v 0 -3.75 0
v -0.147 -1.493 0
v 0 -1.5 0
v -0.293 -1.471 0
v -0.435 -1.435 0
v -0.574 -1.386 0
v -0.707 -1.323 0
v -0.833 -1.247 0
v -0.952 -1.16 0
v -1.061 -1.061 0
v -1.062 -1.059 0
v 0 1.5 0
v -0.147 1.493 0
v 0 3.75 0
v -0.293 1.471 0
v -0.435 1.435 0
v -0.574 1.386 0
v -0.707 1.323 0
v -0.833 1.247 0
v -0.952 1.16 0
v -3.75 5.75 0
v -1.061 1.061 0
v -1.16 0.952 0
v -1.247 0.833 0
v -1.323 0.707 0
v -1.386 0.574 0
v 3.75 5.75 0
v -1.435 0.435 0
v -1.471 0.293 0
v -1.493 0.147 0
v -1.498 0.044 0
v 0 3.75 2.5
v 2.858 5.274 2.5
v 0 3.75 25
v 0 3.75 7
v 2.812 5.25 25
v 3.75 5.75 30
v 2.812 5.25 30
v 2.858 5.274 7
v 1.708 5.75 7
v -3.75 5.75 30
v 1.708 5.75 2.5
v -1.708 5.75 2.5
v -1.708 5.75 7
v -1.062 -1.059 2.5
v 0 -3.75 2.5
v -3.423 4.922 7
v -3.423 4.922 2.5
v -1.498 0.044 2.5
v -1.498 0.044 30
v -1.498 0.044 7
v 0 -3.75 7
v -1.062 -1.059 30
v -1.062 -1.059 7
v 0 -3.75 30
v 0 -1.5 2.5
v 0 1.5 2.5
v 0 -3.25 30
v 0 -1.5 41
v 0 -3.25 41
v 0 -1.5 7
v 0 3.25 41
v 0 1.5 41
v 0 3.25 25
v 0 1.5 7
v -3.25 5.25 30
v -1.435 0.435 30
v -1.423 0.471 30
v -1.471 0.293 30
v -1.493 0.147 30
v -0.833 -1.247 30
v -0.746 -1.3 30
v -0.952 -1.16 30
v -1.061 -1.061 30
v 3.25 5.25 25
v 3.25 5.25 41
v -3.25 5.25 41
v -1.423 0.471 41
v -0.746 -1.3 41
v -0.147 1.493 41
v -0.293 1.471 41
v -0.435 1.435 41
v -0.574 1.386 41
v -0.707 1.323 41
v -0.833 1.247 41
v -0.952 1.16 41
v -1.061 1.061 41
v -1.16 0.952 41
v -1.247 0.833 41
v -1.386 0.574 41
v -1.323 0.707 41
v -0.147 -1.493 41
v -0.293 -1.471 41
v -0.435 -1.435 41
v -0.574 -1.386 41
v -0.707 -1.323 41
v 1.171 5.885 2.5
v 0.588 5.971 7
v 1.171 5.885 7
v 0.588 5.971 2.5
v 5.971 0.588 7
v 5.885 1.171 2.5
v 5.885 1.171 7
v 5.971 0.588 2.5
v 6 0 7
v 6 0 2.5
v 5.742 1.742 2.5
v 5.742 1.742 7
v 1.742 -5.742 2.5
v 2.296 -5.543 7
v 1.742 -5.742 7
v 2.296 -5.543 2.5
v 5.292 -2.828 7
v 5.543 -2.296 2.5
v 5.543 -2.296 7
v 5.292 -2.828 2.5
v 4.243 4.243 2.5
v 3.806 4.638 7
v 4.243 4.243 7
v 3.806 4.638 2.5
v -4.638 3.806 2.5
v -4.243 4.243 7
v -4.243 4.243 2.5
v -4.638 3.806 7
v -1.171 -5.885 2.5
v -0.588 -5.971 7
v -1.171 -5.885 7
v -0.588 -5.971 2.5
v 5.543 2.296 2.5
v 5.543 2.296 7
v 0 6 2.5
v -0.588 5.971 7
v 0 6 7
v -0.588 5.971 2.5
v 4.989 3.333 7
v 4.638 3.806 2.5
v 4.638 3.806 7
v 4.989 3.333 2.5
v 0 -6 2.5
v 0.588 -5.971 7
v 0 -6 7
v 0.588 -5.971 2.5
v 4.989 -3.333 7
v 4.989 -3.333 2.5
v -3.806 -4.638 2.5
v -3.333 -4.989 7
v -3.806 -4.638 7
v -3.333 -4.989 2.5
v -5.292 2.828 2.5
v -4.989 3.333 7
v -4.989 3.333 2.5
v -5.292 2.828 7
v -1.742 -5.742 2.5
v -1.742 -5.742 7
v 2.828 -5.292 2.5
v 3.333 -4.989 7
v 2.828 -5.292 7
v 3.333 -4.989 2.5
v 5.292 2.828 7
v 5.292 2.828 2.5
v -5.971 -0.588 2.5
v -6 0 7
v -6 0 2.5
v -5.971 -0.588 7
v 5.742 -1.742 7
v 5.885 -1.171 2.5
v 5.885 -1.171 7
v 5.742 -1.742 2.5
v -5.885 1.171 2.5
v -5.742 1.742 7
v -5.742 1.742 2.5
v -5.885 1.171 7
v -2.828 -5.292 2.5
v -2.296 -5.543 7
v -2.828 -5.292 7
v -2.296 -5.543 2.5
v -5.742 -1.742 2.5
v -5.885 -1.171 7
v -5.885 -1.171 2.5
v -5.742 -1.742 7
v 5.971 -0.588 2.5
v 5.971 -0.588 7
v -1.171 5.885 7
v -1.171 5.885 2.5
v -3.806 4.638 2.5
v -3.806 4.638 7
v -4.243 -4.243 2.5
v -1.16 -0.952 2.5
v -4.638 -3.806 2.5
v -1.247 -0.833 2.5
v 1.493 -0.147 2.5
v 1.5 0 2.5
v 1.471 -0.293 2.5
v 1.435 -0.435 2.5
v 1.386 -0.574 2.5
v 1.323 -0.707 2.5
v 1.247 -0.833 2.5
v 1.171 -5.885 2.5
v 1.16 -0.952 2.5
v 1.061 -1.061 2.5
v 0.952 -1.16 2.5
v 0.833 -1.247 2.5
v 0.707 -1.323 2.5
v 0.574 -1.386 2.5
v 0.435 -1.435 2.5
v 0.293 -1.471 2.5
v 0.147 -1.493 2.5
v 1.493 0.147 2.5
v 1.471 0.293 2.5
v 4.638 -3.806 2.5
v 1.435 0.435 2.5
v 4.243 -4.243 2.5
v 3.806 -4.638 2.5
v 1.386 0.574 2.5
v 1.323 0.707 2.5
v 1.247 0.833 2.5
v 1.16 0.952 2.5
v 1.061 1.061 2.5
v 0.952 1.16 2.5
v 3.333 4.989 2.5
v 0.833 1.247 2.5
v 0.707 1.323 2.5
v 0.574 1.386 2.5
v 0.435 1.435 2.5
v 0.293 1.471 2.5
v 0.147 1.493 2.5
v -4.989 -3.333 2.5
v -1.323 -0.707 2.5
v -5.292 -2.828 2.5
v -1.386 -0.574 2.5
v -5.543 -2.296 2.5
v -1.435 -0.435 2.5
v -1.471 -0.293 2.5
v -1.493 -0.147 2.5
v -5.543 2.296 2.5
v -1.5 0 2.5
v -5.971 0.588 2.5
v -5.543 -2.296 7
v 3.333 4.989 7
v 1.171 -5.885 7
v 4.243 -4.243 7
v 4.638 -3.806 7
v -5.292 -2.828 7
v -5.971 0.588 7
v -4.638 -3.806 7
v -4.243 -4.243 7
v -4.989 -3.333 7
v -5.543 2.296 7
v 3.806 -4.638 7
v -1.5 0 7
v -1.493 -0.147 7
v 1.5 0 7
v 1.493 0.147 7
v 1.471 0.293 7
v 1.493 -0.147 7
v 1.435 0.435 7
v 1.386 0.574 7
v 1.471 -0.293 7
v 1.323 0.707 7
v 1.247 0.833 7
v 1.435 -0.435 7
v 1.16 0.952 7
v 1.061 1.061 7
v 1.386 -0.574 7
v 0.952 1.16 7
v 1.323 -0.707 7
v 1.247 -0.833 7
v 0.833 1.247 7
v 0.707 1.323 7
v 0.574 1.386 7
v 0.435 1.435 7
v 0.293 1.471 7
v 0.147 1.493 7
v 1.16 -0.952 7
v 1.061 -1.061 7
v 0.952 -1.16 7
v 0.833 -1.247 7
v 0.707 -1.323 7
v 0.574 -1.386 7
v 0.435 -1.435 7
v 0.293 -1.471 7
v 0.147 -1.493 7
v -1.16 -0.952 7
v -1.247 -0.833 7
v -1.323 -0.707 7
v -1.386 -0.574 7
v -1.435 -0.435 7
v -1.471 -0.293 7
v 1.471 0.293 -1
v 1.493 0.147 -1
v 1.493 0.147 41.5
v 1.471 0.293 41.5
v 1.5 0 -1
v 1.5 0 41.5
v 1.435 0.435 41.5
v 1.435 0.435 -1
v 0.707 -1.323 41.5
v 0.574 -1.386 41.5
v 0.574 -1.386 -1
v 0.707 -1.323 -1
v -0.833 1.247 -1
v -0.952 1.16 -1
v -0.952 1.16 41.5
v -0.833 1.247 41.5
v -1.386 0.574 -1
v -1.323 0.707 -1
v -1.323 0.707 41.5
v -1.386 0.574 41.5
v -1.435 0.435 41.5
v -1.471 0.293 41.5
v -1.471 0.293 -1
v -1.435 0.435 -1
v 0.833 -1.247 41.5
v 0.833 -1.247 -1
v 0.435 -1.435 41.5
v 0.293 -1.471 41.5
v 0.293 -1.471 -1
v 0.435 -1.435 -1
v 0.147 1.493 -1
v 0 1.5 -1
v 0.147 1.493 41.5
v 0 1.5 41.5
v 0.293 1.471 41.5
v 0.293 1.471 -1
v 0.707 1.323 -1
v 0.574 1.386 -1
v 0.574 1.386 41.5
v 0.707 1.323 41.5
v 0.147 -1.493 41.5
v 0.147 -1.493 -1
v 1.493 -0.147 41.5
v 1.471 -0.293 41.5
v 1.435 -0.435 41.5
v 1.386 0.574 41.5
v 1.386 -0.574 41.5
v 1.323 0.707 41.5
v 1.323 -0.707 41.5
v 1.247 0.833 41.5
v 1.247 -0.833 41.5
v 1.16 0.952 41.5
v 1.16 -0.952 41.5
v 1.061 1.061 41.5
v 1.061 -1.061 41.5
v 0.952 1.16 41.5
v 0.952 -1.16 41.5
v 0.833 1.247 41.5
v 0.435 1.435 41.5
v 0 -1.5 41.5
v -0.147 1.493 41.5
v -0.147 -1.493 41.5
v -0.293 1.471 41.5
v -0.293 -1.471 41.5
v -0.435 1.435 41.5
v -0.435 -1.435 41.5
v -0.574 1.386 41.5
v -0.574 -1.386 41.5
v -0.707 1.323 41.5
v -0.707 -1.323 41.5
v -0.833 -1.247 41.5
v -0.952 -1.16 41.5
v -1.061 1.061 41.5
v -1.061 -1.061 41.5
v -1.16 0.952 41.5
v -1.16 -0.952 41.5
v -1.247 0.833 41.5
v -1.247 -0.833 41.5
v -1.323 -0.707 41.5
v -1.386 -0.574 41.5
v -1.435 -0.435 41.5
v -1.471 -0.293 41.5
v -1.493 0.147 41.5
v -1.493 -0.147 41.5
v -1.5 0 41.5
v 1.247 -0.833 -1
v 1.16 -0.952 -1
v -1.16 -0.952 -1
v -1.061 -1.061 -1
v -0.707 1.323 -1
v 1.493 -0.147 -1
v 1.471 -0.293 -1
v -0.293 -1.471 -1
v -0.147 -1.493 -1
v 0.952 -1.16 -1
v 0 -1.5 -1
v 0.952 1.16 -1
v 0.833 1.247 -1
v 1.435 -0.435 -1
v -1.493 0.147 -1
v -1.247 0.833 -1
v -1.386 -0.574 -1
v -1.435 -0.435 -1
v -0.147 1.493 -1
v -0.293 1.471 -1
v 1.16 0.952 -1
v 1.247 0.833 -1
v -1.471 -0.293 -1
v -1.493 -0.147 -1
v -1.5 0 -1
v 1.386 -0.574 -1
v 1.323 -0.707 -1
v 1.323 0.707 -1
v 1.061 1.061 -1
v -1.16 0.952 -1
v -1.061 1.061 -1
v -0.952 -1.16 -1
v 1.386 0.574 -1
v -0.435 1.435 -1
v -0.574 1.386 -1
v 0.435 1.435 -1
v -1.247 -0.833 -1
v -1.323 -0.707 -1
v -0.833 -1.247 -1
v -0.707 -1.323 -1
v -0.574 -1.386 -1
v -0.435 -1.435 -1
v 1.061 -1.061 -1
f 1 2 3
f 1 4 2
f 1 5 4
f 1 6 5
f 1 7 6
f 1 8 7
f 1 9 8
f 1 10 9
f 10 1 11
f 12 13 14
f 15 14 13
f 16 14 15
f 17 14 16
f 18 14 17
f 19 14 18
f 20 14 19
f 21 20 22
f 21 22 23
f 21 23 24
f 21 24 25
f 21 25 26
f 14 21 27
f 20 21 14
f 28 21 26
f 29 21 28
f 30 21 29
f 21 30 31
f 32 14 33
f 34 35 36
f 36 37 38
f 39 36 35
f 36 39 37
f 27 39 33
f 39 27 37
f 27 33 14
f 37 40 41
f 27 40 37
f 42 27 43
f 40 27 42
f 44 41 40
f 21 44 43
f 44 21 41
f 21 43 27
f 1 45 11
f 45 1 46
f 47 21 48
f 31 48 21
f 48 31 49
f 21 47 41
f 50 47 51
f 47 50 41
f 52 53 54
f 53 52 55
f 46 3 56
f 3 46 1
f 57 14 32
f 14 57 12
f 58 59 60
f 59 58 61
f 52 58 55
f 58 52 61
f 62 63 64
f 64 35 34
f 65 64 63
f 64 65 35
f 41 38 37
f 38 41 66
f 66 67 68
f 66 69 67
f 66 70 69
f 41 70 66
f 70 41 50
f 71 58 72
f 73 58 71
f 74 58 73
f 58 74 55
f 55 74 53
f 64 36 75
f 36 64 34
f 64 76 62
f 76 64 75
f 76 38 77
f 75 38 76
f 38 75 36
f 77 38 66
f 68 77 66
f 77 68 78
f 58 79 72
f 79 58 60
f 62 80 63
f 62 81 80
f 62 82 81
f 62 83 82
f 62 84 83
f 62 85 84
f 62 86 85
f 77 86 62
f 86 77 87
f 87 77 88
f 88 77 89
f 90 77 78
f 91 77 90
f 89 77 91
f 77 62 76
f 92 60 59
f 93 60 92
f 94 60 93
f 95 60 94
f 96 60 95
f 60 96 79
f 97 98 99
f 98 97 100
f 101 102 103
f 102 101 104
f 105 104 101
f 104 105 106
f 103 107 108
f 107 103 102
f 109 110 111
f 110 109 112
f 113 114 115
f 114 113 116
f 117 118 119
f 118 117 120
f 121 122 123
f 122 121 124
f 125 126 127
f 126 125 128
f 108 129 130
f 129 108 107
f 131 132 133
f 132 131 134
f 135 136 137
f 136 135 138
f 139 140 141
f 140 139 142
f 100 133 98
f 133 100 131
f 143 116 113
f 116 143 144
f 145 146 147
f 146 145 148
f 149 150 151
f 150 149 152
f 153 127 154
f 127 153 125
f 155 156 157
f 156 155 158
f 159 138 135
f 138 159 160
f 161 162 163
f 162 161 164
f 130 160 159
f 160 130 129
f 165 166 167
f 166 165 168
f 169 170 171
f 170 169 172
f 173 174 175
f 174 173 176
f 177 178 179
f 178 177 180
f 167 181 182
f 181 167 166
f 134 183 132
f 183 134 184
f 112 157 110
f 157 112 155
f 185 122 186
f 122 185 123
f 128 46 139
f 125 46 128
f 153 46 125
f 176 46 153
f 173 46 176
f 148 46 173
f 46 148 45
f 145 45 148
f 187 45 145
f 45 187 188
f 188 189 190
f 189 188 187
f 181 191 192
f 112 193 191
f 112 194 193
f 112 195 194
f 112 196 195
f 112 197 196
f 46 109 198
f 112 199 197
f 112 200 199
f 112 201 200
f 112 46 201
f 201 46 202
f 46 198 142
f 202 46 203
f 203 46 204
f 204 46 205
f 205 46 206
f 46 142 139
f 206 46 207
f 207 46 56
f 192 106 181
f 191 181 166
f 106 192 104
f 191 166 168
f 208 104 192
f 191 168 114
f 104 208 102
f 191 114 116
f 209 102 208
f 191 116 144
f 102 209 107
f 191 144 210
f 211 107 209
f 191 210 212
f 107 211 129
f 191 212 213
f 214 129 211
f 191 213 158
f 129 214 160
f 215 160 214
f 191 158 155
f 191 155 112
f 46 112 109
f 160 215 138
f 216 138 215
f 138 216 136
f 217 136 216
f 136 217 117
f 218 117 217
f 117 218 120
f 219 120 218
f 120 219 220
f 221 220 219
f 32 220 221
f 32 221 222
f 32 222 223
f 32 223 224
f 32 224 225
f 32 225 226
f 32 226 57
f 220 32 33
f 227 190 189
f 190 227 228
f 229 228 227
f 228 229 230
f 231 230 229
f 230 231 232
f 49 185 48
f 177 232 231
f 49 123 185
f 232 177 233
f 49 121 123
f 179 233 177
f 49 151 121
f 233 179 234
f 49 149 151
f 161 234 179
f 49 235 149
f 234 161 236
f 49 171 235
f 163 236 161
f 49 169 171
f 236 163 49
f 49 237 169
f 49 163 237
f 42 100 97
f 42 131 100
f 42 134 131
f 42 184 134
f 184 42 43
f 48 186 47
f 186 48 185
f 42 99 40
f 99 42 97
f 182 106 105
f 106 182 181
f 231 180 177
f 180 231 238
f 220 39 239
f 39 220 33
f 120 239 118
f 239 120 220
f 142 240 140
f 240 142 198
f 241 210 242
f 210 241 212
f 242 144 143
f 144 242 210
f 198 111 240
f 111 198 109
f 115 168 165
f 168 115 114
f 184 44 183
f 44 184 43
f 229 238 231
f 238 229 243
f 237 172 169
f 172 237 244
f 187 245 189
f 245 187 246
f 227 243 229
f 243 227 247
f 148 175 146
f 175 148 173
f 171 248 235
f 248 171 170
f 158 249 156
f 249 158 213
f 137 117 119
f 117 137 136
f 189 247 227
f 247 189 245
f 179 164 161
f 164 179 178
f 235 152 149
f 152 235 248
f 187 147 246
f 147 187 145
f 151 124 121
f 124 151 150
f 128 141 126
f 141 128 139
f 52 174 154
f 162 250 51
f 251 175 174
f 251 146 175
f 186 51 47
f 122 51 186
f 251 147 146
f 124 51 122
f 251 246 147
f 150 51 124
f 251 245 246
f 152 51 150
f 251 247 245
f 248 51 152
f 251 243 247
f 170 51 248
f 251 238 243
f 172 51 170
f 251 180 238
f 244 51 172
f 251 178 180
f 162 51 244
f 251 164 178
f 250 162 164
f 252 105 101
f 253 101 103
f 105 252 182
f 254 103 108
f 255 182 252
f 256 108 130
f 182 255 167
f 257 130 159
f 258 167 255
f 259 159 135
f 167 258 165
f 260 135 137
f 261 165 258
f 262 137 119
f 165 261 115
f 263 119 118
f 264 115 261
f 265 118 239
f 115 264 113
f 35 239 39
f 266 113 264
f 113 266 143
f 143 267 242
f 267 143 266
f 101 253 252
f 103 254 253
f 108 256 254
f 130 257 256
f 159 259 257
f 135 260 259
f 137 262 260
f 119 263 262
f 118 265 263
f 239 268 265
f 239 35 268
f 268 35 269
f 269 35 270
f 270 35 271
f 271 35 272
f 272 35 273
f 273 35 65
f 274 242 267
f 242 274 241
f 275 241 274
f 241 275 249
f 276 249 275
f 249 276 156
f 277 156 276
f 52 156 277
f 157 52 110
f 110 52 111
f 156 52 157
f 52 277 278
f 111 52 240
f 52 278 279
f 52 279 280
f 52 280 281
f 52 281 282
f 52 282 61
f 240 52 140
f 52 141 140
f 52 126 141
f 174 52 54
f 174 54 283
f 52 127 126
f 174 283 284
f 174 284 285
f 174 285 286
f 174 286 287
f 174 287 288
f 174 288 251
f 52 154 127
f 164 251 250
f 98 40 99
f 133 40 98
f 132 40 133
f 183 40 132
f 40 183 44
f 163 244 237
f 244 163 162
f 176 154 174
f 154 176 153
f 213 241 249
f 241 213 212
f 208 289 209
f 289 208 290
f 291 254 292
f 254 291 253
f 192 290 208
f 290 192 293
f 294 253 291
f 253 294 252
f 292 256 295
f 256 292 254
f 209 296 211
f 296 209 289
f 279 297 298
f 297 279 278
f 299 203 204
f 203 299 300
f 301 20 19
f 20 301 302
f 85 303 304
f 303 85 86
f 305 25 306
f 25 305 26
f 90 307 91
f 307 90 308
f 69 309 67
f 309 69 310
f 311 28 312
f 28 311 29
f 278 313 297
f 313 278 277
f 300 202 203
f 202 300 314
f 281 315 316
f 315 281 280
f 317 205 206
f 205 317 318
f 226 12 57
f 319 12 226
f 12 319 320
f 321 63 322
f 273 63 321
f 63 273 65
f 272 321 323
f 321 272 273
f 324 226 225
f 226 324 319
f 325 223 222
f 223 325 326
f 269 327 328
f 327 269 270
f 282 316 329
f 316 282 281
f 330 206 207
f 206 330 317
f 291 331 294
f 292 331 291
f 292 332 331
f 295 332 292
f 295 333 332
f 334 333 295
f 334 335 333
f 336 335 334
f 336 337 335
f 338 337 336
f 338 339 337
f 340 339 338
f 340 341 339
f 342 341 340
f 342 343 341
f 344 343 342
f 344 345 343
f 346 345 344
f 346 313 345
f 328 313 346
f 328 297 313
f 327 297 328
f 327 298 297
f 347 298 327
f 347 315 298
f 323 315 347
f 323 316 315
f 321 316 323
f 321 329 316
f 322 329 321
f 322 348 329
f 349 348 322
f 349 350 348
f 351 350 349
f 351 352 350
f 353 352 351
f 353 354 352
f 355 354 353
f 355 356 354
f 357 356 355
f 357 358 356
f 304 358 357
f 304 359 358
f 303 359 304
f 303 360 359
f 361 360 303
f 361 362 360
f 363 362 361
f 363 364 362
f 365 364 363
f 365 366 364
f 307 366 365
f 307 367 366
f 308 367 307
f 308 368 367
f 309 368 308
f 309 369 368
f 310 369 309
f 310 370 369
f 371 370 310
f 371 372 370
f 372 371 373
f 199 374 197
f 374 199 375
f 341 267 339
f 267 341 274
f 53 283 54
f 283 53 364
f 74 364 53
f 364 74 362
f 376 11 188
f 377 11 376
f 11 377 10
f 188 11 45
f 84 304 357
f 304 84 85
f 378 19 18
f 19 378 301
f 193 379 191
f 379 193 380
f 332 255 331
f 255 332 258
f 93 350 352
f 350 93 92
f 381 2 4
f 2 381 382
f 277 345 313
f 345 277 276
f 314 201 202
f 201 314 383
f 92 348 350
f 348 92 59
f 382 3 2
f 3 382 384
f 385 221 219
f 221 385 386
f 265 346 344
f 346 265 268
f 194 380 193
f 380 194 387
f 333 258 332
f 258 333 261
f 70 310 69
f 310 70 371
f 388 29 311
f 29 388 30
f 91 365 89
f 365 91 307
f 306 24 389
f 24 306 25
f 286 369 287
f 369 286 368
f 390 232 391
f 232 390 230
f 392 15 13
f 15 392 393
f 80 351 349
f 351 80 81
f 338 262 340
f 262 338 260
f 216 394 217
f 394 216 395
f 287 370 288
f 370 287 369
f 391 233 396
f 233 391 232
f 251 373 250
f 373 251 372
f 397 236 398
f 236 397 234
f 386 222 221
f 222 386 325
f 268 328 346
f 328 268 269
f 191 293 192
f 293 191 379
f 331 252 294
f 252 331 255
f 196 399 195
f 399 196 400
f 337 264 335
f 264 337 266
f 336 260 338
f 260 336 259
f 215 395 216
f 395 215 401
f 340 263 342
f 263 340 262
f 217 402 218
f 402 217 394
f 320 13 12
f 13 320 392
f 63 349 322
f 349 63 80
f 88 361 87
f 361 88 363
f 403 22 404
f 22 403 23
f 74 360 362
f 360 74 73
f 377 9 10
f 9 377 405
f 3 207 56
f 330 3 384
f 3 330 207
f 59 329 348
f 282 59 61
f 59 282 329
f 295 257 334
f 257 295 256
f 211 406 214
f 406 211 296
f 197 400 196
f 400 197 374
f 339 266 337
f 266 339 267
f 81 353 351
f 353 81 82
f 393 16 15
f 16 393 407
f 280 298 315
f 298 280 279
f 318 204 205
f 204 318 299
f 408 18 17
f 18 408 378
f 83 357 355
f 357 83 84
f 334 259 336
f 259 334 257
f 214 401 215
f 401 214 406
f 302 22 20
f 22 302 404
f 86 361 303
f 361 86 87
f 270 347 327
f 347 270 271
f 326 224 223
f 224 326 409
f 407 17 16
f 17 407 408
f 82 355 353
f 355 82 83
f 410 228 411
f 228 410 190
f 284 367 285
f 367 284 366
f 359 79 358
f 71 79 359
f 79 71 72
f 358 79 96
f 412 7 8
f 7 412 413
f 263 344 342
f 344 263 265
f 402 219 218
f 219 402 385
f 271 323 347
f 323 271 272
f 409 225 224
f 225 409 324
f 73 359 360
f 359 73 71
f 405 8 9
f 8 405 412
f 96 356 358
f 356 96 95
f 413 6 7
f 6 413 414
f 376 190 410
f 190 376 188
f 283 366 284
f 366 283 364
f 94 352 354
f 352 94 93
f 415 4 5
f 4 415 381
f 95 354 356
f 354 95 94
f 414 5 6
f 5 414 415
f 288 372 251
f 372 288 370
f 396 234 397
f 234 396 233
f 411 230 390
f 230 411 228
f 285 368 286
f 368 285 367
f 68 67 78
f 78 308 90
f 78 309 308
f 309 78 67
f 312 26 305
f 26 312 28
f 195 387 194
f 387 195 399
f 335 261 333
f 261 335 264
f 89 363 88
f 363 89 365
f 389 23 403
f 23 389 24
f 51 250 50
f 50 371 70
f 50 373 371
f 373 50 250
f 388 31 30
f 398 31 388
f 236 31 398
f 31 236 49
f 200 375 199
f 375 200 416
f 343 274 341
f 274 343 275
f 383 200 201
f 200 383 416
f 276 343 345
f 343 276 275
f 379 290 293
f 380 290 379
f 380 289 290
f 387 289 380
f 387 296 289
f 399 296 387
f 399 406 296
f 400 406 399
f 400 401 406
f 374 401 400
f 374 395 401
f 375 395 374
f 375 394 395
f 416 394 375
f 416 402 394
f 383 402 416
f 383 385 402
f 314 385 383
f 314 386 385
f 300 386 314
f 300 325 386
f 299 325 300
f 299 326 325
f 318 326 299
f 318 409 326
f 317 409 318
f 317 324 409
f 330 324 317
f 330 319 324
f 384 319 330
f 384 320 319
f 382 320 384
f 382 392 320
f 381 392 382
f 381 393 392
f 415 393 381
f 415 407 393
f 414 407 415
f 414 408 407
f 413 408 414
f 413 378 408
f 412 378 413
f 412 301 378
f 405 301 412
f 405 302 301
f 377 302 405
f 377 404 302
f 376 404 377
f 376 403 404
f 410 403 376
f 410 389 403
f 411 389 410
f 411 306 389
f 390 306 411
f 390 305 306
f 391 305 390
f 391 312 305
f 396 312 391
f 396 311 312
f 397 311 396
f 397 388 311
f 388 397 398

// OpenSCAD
// Hose-barb reducer: 8 mm ID -> 5 mm ID
// Print orientation: standing upright along Z

$fn = 64;

// ---- 8 mm tubing barbs ----
barb_h_8 = 20;    // barb height
barb_od_8 = 7.5;  // barb outer diameter (both end and sawtooth bottom)

// ---- 5 mm tubing barbs ----
barb_h_5 = 8;     // barb height
barb_od_5 = 6.5;  // barb outer diameter at bottom (sawtooth peak)

// ---- Common ----
collar_d = 12;    // collar diameter
collar_h = 5;     // collar height
bore_d = 3;       // through-bore diameter
overlap = 0.5;    // overlap between adjacent sections for a clean union

union() {
    // 8 mm barbs: z = 0 to 20
    for (i = [0 : 1])
        translate([0, 0, i * barb_h_8 / 2])
            linear_extrude(height = barb_h_8)
                polygon([
                    [0, -barb_od_8 / 2],
                    [0, barb_od_8 / 2],
                    [barb_od_8 / 2, barb_od_8 / 2 + 2],   // sawtooth tip
                    [-barb_od_8 / 2, barb_od_8 / 2 + 2]
                ]);

    // Collar: z = 20 to 25
    translate([0, 0, collar_h * overlap])
        cylinder(d = collar_d, h = collar_h - overlap);

    // 5 mm barbs: z = 25 to 41
    for (i = [0 : 1])
        translate([0, 0, 25 + i * barb_h_5])
            linear_extrude(height = barb_h_5)
                polygon([
                    [0, -barb_od_5 / 2],
                    [0, barb_od_5 / 2],
                    [barb_od_5 / 2, barb_od_5 / 2 + 2],   // small sawtooth
                    [-barb_od_5 / 2, barb_od_5 / 2 + 2]
                ]);
}

// Through-bore
translate([0, 0, -1])
    cylinder(d = bore_d, h = 42 + overlap);
